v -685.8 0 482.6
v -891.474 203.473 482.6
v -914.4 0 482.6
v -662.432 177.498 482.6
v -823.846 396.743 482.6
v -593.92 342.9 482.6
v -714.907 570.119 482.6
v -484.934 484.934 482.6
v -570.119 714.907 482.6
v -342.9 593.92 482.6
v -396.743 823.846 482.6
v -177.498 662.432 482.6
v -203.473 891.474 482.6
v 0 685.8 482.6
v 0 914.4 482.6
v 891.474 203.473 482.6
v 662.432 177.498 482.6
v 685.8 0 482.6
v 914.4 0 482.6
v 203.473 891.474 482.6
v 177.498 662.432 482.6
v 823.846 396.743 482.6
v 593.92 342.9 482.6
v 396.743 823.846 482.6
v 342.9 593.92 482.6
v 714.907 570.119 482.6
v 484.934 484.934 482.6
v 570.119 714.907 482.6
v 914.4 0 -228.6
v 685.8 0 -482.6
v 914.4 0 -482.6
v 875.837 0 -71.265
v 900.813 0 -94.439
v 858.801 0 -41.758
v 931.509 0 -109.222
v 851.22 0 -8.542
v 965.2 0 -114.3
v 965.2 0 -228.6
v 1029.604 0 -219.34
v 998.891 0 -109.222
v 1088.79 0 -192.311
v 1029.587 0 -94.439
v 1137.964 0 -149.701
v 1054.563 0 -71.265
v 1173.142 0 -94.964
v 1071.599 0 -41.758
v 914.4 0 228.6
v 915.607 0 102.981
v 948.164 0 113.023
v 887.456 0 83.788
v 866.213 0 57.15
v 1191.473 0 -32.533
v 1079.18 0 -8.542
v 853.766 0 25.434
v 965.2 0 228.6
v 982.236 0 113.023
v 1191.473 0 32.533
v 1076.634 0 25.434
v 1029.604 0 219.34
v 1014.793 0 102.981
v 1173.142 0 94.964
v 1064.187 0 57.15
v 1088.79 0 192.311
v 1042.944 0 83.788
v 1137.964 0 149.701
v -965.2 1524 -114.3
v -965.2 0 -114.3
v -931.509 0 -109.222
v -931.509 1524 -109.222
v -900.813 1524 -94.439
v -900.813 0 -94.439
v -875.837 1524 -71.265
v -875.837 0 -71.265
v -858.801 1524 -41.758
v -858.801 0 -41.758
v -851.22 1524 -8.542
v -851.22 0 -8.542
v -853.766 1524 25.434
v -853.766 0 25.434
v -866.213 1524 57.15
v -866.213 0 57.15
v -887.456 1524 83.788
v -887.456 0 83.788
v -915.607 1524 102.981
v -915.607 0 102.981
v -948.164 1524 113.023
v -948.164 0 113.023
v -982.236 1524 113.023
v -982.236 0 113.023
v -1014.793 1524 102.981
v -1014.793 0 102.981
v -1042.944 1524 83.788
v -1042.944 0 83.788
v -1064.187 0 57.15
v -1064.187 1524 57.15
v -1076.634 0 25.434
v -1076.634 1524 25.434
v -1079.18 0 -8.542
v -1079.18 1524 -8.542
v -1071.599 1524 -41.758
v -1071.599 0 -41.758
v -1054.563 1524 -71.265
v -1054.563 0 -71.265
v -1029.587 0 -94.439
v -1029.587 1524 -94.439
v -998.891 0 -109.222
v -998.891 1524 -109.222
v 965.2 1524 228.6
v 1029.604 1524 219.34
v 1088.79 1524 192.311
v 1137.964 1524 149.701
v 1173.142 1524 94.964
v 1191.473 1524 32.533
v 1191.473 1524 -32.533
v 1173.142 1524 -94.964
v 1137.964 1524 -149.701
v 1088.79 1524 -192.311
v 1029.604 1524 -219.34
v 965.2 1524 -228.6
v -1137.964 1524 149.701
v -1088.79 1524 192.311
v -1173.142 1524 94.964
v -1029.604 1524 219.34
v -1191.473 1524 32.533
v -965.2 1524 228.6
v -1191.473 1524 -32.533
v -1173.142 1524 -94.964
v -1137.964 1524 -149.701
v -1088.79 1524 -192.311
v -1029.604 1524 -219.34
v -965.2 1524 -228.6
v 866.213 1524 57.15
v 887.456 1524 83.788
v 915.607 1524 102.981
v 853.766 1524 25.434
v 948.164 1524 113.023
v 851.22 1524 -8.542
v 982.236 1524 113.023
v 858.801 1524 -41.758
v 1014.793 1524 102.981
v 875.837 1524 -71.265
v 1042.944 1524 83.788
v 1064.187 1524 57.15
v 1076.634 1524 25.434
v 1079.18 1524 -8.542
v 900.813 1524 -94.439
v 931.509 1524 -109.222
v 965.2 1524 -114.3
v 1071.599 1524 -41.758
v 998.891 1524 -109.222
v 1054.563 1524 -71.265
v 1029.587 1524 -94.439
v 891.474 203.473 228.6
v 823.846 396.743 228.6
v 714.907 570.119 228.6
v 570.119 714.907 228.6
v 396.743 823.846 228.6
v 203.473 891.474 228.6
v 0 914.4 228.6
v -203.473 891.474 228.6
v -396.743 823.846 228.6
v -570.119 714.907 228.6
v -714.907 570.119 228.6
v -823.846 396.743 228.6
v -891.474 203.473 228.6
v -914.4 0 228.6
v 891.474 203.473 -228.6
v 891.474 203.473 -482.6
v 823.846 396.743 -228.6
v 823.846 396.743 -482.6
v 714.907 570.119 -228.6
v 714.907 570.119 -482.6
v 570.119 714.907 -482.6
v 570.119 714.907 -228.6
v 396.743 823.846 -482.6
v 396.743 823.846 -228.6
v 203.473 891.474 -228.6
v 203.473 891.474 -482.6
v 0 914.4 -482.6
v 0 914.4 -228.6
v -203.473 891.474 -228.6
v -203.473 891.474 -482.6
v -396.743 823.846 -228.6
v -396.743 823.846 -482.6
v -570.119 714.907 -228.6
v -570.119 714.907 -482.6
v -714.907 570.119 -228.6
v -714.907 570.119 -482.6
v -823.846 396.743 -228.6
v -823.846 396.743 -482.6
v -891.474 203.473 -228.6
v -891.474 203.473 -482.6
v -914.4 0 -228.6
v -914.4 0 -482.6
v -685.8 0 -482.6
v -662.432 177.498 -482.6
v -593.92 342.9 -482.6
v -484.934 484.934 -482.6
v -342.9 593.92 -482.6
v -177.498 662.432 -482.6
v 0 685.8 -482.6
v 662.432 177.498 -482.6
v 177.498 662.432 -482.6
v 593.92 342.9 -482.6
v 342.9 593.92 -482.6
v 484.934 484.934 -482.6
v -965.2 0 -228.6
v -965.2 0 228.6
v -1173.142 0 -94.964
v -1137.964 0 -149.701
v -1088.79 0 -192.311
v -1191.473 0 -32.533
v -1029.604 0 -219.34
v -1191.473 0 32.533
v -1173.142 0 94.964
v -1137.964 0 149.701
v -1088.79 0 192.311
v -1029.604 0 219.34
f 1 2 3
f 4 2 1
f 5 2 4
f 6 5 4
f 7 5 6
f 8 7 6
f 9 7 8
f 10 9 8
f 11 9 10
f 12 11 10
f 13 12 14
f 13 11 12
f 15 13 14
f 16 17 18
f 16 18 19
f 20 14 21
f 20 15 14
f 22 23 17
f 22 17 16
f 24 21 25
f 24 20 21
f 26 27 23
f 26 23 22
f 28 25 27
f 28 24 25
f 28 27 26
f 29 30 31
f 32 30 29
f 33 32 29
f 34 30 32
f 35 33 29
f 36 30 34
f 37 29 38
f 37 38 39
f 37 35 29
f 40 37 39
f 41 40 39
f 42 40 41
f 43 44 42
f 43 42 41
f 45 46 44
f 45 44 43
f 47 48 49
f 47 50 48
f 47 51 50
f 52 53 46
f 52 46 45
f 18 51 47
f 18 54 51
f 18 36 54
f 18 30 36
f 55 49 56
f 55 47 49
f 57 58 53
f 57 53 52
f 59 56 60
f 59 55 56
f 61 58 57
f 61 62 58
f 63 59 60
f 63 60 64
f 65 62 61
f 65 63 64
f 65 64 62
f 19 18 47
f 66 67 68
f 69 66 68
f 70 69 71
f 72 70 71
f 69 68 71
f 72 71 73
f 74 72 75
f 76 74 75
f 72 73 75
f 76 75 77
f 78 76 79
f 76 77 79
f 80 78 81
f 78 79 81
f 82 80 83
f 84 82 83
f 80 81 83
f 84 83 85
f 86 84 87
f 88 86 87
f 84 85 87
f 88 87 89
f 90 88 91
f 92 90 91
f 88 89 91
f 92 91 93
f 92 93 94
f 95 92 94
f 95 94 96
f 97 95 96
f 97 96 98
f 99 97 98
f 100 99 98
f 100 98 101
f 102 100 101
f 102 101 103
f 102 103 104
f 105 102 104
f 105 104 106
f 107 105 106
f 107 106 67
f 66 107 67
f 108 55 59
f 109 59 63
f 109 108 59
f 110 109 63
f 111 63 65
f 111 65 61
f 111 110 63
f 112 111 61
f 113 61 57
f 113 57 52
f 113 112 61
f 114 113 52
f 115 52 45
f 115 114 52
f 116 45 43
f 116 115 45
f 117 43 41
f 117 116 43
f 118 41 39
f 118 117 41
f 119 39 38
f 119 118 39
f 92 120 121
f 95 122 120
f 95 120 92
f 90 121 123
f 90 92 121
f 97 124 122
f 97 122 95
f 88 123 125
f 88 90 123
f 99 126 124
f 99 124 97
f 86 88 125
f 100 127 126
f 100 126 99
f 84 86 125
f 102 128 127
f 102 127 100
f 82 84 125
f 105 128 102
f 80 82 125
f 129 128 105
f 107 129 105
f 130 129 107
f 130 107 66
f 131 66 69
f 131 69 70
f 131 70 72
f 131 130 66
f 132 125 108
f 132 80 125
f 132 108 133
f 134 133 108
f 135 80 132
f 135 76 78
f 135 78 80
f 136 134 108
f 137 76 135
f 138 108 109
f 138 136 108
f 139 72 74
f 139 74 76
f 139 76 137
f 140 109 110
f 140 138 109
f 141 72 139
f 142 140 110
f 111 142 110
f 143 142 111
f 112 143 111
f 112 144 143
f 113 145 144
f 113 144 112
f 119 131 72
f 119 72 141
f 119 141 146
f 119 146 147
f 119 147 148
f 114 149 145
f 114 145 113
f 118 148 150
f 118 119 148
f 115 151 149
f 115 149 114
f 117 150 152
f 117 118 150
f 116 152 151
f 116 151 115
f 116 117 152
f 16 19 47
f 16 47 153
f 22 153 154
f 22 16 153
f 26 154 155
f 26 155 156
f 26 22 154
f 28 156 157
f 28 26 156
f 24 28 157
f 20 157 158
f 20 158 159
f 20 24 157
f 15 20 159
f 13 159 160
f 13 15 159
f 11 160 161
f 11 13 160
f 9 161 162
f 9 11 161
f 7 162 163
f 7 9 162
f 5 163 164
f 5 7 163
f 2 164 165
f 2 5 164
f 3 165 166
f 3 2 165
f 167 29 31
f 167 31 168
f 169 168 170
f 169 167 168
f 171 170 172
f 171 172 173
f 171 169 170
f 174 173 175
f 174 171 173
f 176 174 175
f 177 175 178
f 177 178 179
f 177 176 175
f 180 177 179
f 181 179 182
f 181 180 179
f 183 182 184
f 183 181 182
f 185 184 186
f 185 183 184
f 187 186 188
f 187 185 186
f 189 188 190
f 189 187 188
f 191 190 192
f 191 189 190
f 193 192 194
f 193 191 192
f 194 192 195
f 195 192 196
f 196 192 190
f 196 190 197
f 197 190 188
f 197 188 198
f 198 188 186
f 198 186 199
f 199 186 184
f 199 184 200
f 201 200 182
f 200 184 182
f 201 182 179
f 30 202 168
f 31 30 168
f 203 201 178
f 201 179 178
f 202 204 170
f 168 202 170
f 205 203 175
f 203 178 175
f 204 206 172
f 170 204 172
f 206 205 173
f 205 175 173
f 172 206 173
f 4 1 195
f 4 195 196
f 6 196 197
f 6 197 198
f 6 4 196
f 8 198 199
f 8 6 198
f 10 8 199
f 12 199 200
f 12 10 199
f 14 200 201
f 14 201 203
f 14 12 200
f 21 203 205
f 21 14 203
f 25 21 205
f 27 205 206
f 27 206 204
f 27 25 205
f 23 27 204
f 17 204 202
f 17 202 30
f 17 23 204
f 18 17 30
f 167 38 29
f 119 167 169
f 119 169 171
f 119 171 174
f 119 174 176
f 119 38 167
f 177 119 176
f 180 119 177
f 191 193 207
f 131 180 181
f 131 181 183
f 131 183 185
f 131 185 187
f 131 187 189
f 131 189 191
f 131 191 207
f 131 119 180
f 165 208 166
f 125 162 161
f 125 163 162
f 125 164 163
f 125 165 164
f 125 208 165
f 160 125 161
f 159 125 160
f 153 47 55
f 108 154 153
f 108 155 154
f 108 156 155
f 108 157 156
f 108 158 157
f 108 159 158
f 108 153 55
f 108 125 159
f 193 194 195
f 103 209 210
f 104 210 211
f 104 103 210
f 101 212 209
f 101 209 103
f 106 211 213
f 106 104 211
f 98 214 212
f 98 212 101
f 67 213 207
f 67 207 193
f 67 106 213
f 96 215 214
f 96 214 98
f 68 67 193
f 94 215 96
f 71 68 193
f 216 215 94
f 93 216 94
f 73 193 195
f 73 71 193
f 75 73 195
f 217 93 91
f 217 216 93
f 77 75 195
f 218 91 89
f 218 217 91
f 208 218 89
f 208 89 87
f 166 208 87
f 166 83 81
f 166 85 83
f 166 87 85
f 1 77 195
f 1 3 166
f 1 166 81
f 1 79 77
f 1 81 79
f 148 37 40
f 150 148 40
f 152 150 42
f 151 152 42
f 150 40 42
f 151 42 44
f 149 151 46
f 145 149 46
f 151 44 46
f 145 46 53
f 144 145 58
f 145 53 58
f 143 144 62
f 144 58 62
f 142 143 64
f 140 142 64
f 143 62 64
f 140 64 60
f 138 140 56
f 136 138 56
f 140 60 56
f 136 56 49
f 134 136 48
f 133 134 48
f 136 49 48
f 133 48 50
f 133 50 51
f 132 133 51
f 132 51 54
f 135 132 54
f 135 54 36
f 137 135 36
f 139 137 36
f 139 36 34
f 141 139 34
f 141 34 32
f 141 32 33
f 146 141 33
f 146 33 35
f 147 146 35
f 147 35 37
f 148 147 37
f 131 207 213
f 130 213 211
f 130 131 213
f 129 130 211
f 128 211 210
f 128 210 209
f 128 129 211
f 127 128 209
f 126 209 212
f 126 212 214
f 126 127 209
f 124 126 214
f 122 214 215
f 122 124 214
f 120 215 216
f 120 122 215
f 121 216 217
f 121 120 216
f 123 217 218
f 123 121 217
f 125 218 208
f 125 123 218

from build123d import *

# Parameters (mm, degrees)
BOSS_EXTRUDE1_DEPTH = 482.6
BOSS_EXTRUDE2_REACH = 1843.631
CUT_EXTRUDE2_DEPTH  = 2063.411181118
SKETCH9_R           = 114.3
CUT_EXTRUDE3_DEPTH  = 1996.153427684


with BuildPart() as part:
    # Sketch1 → Boss-Extrude1 (new, symmetric)
    with BuildSketch(Plane.XY):
        with BuildLine():
            Line((-914.4, 0), (-685.8, 0))
            ThreePointArc((-685.8, 0), (0, 685.8), (685.8, 0))
            Line((685.8, 0), (914.4, 0))
            ThreePointArc((914.4, 0), (0, 914.4), (-914.4, 0))
        make_face()
    extrude(amount=BOSS_EXTRUDE1_DEPTH, both=True)

    # Boss-Extrude2: up to this face of the body (flat: up to its plane)
    boss_extrude2_end = Plane(part.part.faces().sort_by_distance((-800.1, 0, 0))[0])
    # Sketch7 → Boss-Extrude2 (add, up to the picked face)
    with BuildSketch(Plane(origin=(0, 1524, 0), x_dir=(-1, 0, 0), z_dir=(0, -1, 0)), mode=Mode.PRIVATE) as boss_extrude2_sk1:
        with BuildLine():
            Line((965.2, -228.6), (-965.2, -228.6))
            ThreePointArc((-965.2, -228.6), (-1193.8, 0), (-965.2, 228.6))
            Line((-965.2, 228.6), (965.2, 228.6))
            ThreePointArc((965.2, 228.6), (1193.8, 0), (965.2, -228.6))
        make_face()
    boss_extrude2_tool1 = split(extrude(boss_extrude2_sk1.sketch, amount=BOSS_EXTRUDE2_REACH, mode=Mode.PRIVATE), bisect_by=boss_extrude2_end, keep=Keep.BOTH, mode=Mode.PRIVATE)
    add(boss_extrude2_tool1.solids().sort_by(Axis((0, 1524, 0), (0, -1, 0)))[0])

    # Sketch8 → Cut-Extrude2 (cut, through all)
    with BuildSketch(Plane.XY.offset(228.6)):
        with BuildLine():
            Line((-685.8, 0), (685.8, 0))
            ThreePointArc((685.8, 0), (0, 685.8), (-685.8, 0))
        make_face()
    extrude(amount=-CUT_EXTRUDE2_DEPTH, mode=Mode.SUBTRACT)

    # Sketch9 → Cut-Extrude3 (cut, through all)
    with BuildSketch(Plane.XZ):
        with Locations(Location((-965.2, 0, 0), (0, 0, 270))):
            Circle(SKETCH9_R)
        with Locations(Location((965.2, 0, 0), (0, 0, 270))):
            Circle(SKETCH9_R)
    extrude(amount=-CUT_EXTRUDE3_DEPTH, mode=Mode.SUBTRACT)


solid = part.part
